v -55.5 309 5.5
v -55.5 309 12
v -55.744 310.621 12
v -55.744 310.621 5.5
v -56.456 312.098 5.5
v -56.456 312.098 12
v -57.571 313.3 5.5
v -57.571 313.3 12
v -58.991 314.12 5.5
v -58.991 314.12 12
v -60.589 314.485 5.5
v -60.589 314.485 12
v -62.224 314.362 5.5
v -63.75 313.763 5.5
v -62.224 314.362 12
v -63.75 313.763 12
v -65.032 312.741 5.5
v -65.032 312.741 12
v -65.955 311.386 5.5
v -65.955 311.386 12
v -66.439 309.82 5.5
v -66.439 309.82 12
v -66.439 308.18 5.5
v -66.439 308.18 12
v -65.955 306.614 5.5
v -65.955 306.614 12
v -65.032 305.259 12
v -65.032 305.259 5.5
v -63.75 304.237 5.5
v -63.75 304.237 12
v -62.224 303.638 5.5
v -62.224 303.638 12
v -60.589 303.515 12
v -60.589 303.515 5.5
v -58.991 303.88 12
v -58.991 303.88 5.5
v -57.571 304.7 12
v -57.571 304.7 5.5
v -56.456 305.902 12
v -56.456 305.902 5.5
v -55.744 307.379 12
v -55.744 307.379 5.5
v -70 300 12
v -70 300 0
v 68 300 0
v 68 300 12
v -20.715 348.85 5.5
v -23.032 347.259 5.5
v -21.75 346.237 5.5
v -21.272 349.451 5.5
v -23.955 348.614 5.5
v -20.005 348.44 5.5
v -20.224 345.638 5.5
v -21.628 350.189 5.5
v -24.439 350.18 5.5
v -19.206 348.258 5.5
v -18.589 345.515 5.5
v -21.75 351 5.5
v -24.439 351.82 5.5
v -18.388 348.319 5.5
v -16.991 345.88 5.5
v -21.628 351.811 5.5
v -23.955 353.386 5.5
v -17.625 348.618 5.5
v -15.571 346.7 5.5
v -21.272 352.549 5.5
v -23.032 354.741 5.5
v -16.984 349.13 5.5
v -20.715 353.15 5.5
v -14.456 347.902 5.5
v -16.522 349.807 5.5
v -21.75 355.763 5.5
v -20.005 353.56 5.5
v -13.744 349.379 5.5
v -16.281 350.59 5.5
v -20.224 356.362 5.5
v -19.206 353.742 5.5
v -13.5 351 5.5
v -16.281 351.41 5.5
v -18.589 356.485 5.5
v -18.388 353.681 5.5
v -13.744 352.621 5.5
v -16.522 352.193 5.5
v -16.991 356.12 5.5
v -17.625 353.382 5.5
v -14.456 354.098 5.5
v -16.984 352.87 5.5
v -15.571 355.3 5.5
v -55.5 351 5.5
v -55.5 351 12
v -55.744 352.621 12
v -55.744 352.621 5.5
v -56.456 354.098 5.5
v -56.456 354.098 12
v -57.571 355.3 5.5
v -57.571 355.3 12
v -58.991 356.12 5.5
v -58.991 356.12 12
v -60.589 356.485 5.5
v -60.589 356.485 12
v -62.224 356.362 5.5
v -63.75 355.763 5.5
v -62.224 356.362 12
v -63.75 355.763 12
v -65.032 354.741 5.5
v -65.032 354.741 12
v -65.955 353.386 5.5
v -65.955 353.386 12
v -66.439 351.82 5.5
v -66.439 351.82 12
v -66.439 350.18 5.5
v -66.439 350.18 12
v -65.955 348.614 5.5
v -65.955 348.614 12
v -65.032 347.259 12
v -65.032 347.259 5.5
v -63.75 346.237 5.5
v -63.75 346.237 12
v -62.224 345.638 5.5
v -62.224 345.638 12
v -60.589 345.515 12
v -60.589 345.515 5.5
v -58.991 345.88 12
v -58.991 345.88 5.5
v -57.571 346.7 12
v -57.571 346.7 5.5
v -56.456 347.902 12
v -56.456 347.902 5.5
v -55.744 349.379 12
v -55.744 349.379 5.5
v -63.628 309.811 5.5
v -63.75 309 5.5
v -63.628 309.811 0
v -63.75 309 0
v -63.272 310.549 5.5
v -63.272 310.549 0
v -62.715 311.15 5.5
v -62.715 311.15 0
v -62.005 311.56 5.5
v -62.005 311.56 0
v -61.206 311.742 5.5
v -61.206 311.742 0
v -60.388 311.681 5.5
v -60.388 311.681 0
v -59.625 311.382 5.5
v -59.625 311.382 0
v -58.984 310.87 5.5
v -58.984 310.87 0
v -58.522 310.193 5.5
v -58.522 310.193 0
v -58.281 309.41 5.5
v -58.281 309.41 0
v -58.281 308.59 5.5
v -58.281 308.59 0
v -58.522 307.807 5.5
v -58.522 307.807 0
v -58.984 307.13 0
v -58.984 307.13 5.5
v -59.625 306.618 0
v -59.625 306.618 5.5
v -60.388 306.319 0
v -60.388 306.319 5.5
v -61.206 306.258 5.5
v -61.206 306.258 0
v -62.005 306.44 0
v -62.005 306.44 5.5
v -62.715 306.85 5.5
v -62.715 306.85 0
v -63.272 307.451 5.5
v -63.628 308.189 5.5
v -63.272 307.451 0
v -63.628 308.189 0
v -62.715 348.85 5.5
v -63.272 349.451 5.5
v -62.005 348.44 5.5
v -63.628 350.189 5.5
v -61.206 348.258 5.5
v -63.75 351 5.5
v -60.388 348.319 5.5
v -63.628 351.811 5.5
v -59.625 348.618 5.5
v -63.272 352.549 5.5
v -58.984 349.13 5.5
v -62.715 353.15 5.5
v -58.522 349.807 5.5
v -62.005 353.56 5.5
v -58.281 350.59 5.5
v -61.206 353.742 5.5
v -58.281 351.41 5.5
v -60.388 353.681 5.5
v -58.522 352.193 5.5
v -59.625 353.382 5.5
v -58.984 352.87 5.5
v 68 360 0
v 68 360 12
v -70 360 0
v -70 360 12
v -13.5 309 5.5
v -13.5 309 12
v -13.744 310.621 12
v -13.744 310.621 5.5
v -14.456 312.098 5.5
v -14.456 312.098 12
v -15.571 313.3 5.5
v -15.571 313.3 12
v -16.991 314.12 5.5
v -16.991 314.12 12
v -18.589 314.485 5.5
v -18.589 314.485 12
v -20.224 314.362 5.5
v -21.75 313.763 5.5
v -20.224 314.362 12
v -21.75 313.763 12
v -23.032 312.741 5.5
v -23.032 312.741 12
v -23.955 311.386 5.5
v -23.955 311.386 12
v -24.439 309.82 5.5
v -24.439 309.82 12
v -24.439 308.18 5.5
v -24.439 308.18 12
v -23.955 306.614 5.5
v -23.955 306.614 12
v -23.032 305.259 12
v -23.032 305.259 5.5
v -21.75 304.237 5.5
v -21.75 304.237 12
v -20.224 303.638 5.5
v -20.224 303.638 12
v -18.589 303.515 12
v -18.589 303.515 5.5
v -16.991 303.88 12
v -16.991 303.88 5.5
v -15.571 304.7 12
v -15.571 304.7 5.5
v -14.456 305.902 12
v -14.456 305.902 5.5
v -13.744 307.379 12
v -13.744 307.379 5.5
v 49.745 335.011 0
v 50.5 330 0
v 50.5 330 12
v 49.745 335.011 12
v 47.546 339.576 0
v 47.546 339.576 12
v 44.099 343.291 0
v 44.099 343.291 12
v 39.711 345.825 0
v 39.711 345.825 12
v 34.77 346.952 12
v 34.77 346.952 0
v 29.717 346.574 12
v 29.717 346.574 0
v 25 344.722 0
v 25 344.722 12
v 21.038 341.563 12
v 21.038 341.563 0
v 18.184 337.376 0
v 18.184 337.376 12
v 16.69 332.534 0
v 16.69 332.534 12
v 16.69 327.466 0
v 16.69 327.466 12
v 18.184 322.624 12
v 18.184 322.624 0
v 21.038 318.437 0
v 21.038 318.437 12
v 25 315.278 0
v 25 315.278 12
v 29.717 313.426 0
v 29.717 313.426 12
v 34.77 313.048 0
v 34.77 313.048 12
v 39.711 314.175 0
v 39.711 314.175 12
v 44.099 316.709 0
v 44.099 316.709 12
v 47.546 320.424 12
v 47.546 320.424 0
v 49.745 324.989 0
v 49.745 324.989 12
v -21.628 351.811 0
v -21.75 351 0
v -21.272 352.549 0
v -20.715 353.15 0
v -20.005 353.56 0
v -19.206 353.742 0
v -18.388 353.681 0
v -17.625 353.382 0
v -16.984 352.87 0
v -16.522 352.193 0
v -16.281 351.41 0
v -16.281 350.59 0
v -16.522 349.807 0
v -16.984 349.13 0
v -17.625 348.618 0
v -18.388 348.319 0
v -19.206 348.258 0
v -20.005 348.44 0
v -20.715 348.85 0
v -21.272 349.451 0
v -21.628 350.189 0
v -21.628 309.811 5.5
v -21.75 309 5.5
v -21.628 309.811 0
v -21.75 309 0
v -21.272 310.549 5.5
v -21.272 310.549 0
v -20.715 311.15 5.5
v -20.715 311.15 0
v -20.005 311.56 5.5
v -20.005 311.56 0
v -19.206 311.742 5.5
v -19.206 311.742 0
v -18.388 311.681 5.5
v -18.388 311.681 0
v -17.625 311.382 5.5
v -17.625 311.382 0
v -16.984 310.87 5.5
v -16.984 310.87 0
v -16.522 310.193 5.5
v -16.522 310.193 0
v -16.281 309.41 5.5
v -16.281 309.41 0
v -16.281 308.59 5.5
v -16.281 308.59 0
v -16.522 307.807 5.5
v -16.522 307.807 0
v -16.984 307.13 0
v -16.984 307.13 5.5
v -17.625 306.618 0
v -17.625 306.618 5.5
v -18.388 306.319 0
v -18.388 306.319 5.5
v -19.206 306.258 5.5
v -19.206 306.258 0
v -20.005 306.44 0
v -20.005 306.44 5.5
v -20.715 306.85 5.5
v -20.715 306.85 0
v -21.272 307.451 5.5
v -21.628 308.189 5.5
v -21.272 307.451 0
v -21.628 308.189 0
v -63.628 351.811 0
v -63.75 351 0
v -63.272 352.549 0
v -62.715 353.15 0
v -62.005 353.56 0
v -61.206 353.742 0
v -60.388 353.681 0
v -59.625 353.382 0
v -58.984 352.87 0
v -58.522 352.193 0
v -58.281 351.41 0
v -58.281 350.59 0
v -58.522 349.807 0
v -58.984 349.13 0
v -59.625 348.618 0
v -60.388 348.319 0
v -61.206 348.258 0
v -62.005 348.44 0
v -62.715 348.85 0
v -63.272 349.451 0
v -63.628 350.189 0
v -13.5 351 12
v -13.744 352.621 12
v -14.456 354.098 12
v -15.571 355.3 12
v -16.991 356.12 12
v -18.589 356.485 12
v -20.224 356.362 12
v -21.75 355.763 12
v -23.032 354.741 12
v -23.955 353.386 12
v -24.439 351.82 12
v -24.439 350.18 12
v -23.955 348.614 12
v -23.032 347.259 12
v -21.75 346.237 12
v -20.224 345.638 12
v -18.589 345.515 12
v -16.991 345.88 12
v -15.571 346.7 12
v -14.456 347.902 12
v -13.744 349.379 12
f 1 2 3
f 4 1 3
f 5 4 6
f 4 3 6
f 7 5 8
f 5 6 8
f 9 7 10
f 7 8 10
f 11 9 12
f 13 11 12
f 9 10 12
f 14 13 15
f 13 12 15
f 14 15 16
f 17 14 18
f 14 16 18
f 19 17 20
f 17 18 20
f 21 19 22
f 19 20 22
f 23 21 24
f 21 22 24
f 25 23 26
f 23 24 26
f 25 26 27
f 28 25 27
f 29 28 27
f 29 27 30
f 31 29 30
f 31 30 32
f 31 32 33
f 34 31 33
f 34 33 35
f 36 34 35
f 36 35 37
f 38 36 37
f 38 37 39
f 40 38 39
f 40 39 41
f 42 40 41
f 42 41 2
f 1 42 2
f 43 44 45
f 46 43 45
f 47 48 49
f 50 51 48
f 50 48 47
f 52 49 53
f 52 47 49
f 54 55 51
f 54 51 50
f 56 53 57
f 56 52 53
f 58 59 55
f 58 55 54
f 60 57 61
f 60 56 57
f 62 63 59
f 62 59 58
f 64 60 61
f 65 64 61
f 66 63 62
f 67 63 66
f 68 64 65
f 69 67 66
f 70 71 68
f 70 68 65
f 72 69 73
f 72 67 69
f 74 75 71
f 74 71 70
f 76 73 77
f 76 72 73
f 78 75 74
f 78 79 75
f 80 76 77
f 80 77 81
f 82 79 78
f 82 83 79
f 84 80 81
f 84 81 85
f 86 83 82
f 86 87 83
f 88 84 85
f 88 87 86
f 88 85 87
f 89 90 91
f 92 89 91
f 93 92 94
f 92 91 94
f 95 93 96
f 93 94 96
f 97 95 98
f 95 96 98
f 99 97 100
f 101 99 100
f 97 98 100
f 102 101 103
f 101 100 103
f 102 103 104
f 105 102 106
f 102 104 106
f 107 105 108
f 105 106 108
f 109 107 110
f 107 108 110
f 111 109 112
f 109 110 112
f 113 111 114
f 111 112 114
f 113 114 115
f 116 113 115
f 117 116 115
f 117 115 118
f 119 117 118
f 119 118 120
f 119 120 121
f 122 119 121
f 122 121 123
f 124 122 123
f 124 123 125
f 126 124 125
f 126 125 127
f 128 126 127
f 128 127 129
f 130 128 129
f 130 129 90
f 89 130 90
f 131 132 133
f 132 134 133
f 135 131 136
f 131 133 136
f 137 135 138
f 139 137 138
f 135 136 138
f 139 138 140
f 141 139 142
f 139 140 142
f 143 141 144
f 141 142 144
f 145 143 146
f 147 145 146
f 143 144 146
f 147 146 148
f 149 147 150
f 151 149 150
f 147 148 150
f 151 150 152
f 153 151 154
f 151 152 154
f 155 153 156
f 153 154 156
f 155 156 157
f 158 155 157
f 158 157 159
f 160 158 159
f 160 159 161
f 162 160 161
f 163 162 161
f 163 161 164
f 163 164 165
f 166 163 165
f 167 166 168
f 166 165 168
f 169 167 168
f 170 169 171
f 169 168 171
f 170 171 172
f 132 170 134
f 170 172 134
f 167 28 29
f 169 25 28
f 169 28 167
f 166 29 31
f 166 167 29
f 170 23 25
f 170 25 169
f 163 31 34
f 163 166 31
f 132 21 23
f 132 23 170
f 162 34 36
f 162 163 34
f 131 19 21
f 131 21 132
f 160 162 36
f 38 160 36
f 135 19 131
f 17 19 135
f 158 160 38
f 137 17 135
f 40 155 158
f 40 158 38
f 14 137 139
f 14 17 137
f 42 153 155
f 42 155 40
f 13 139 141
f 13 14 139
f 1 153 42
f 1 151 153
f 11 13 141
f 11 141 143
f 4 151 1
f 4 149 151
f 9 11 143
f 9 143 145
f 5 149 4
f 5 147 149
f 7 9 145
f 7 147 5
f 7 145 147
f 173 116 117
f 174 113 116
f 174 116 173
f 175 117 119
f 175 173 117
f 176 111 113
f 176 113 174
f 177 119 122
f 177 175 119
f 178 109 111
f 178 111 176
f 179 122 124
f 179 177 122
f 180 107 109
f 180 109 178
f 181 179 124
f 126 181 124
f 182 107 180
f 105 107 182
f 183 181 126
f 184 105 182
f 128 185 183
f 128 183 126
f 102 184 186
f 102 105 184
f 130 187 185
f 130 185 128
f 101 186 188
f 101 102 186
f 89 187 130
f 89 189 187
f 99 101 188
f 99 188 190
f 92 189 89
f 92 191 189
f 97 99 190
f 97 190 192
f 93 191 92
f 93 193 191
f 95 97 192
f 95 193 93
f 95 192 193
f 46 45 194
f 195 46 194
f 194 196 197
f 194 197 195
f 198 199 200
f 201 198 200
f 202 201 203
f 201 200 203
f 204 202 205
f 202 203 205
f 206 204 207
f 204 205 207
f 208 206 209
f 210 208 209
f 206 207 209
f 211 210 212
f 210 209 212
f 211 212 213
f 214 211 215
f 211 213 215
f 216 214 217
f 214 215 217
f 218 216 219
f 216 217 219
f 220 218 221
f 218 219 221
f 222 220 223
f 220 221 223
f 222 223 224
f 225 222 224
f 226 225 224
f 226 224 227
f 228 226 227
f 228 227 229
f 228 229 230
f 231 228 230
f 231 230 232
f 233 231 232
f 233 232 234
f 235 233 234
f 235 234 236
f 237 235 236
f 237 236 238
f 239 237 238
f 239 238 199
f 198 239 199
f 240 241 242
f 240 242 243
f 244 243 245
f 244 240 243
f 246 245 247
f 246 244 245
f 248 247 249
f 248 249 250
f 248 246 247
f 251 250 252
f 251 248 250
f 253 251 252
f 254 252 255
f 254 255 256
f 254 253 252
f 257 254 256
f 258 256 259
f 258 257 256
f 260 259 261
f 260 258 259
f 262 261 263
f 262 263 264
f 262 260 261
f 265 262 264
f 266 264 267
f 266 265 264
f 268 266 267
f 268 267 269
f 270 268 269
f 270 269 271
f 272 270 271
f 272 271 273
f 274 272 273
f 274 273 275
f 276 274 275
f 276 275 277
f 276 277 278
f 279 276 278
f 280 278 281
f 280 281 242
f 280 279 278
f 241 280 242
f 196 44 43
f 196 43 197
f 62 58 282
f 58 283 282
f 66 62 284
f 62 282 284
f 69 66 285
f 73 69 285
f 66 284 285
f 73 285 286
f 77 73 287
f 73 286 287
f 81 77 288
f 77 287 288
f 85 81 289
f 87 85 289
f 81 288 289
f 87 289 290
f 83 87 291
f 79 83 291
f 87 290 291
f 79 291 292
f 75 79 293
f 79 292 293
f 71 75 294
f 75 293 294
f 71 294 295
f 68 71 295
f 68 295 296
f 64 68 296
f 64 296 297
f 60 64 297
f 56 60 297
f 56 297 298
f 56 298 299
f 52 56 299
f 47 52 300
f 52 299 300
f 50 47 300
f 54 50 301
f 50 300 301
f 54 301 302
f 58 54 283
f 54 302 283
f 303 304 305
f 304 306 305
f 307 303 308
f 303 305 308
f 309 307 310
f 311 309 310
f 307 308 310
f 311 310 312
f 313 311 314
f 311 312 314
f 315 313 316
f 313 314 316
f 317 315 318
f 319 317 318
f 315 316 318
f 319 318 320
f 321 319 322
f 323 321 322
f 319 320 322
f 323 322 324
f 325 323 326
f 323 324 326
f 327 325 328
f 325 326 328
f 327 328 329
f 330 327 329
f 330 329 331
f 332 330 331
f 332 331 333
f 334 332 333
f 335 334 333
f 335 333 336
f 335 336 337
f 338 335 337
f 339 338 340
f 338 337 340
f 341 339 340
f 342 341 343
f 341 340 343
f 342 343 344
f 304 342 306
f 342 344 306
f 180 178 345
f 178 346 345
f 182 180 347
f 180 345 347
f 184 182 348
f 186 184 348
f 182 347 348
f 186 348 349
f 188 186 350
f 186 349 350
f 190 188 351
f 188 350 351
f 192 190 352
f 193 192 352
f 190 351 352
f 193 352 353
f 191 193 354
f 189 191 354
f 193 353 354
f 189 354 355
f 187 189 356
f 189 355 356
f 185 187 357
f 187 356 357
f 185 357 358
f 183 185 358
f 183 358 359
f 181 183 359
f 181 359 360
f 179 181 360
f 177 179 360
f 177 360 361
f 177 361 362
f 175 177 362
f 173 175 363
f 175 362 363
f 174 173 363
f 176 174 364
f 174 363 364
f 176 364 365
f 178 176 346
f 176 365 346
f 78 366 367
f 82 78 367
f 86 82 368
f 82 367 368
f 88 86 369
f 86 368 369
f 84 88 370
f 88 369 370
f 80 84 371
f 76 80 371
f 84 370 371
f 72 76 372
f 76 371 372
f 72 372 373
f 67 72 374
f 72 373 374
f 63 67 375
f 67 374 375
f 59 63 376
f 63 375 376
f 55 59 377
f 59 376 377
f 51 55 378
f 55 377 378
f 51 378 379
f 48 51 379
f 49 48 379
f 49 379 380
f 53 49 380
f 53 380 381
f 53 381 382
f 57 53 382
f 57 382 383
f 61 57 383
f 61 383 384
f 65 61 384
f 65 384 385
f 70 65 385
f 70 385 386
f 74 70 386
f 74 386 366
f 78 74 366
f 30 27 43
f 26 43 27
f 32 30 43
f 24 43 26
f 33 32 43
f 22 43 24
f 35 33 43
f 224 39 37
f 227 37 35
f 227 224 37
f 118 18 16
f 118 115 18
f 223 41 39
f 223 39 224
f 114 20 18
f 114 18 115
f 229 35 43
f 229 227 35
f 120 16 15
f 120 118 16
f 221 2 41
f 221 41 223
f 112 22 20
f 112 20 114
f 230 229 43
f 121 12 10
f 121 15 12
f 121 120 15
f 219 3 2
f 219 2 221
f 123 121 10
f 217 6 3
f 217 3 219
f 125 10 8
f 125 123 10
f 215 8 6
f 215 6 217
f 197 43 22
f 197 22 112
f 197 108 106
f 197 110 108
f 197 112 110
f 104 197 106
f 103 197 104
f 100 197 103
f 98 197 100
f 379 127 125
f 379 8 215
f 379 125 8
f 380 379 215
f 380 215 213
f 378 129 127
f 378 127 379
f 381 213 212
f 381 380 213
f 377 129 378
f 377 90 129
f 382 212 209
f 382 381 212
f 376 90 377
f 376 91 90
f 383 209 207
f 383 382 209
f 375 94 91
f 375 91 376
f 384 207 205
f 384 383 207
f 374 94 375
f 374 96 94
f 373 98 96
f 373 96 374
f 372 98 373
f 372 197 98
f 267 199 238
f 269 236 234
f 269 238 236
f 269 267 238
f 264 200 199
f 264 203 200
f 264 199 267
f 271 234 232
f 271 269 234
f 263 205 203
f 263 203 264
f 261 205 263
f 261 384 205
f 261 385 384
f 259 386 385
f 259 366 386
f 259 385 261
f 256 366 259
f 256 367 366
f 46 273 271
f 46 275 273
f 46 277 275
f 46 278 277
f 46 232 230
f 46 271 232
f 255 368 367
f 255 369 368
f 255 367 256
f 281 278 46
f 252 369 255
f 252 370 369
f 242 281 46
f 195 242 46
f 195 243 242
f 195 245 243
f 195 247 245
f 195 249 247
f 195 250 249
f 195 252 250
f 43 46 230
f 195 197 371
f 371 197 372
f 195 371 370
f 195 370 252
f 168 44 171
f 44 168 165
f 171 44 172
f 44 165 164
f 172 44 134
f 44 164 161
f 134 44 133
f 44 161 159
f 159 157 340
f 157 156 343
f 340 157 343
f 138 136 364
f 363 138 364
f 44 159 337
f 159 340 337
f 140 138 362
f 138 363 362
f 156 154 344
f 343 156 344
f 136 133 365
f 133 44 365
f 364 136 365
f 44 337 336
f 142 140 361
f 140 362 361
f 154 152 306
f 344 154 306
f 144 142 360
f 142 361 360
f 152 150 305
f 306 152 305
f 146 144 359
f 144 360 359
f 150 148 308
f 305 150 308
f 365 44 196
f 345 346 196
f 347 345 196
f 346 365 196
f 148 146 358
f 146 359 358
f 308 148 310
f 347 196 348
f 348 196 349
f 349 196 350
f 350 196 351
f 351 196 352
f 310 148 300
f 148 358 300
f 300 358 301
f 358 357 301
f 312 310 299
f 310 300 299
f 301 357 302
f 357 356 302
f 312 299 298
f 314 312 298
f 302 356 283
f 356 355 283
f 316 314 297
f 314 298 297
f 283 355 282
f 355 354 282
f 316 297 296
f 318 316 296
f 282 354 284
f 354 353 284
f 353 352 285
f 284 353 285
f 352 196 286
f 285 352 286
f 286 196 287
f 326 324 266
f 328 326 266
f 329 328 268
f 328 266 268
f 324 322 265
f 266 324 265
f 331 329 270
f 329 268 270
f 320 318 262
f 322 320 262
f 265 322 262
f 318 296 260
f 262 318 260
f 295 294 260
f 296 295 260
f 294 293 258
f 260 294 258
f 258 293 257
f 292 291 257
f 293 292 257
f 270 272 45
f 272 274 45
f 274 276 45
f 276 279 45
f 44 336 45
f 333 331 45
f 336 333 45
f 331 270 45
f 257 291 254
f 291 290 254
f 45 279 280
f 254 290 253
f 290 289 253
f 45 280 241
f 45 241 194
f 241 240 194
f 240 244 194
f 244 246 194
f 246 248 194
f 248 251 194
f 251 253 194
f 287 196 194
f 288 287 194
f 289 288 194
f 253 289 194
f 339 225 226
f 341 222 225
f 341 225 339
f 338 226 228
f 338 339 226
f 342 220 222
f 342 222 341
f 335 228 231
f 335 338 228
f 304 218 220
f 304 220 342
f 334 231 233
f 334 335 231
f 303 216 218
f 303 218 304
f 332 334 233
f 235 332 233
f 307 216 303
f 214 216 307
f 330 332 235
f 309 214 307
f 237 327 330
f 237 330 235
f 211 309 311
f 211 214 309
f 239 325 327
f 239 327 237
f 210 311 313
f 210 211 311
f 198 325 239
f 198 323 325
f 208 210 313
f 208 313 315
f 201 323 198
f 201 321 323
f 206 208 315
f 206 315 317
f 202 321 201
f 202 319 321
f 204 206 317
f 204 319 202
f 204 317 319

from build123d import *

# Parameters (mm, degrees)
SZKIC1_W                                             = 138
SZKIC1_H                                             = 60
SZKIC1_R                                             = 17
DODANIE_WYCI_GNI_CIE1_DEPTH                          = 12
POG_BIENIE_WALCOWE_POD_M5_WKR_T_DO_CZ_CI_D           = 5.5
POG_BIENIE_WALCOWE_POD_M5_WKR_T_DO_CZ_CI_CBORE_D     = 11
POG_BIENIE_WALCOWE_POD_M5_WKR_T_DO_CZ_CI_CBORE_DEPTH = 6.5


with BuildPart() as part:
    # Szkic1 → Dodanie-wyciągnięcie1 (new body)
    with BuildSketch(Plane.XY):
        with Locations((-1, 330)):
            Rectangle(SZKIC1_W, SZKIC1_H)
        with Locations((33.5, 330)):
            Circle(SZKIC1_R, mode=Mode.SUBTRACT)
    extrude(amount=DODANIE_WYCI_GNI_CIE1_DEPTH)

    # Pogłębienie walcowe pod M5 Wkręt do części metalowych z łbem sześciokątnym1 (through all)
    with Locations(Plane.XY.offset(12)):
        with Locations((-61, 351), (-19, 351), (-61, 309), (-19, 309)):
            CounterBoreHole(POG_BIENIE_WALCOWE_POD_M5_WKR_T_DO_CZ_CI_D / 2, POG_BIENIE_WALCOWE_POD_M5_WKR_T_DO_CZ_CI_CBORE_D / 2, POG_BIENIE_WALCOWE_POD_M5_WKR_T_DO_CZ_CI_CBORE_DEPTH)


solid = part.part
